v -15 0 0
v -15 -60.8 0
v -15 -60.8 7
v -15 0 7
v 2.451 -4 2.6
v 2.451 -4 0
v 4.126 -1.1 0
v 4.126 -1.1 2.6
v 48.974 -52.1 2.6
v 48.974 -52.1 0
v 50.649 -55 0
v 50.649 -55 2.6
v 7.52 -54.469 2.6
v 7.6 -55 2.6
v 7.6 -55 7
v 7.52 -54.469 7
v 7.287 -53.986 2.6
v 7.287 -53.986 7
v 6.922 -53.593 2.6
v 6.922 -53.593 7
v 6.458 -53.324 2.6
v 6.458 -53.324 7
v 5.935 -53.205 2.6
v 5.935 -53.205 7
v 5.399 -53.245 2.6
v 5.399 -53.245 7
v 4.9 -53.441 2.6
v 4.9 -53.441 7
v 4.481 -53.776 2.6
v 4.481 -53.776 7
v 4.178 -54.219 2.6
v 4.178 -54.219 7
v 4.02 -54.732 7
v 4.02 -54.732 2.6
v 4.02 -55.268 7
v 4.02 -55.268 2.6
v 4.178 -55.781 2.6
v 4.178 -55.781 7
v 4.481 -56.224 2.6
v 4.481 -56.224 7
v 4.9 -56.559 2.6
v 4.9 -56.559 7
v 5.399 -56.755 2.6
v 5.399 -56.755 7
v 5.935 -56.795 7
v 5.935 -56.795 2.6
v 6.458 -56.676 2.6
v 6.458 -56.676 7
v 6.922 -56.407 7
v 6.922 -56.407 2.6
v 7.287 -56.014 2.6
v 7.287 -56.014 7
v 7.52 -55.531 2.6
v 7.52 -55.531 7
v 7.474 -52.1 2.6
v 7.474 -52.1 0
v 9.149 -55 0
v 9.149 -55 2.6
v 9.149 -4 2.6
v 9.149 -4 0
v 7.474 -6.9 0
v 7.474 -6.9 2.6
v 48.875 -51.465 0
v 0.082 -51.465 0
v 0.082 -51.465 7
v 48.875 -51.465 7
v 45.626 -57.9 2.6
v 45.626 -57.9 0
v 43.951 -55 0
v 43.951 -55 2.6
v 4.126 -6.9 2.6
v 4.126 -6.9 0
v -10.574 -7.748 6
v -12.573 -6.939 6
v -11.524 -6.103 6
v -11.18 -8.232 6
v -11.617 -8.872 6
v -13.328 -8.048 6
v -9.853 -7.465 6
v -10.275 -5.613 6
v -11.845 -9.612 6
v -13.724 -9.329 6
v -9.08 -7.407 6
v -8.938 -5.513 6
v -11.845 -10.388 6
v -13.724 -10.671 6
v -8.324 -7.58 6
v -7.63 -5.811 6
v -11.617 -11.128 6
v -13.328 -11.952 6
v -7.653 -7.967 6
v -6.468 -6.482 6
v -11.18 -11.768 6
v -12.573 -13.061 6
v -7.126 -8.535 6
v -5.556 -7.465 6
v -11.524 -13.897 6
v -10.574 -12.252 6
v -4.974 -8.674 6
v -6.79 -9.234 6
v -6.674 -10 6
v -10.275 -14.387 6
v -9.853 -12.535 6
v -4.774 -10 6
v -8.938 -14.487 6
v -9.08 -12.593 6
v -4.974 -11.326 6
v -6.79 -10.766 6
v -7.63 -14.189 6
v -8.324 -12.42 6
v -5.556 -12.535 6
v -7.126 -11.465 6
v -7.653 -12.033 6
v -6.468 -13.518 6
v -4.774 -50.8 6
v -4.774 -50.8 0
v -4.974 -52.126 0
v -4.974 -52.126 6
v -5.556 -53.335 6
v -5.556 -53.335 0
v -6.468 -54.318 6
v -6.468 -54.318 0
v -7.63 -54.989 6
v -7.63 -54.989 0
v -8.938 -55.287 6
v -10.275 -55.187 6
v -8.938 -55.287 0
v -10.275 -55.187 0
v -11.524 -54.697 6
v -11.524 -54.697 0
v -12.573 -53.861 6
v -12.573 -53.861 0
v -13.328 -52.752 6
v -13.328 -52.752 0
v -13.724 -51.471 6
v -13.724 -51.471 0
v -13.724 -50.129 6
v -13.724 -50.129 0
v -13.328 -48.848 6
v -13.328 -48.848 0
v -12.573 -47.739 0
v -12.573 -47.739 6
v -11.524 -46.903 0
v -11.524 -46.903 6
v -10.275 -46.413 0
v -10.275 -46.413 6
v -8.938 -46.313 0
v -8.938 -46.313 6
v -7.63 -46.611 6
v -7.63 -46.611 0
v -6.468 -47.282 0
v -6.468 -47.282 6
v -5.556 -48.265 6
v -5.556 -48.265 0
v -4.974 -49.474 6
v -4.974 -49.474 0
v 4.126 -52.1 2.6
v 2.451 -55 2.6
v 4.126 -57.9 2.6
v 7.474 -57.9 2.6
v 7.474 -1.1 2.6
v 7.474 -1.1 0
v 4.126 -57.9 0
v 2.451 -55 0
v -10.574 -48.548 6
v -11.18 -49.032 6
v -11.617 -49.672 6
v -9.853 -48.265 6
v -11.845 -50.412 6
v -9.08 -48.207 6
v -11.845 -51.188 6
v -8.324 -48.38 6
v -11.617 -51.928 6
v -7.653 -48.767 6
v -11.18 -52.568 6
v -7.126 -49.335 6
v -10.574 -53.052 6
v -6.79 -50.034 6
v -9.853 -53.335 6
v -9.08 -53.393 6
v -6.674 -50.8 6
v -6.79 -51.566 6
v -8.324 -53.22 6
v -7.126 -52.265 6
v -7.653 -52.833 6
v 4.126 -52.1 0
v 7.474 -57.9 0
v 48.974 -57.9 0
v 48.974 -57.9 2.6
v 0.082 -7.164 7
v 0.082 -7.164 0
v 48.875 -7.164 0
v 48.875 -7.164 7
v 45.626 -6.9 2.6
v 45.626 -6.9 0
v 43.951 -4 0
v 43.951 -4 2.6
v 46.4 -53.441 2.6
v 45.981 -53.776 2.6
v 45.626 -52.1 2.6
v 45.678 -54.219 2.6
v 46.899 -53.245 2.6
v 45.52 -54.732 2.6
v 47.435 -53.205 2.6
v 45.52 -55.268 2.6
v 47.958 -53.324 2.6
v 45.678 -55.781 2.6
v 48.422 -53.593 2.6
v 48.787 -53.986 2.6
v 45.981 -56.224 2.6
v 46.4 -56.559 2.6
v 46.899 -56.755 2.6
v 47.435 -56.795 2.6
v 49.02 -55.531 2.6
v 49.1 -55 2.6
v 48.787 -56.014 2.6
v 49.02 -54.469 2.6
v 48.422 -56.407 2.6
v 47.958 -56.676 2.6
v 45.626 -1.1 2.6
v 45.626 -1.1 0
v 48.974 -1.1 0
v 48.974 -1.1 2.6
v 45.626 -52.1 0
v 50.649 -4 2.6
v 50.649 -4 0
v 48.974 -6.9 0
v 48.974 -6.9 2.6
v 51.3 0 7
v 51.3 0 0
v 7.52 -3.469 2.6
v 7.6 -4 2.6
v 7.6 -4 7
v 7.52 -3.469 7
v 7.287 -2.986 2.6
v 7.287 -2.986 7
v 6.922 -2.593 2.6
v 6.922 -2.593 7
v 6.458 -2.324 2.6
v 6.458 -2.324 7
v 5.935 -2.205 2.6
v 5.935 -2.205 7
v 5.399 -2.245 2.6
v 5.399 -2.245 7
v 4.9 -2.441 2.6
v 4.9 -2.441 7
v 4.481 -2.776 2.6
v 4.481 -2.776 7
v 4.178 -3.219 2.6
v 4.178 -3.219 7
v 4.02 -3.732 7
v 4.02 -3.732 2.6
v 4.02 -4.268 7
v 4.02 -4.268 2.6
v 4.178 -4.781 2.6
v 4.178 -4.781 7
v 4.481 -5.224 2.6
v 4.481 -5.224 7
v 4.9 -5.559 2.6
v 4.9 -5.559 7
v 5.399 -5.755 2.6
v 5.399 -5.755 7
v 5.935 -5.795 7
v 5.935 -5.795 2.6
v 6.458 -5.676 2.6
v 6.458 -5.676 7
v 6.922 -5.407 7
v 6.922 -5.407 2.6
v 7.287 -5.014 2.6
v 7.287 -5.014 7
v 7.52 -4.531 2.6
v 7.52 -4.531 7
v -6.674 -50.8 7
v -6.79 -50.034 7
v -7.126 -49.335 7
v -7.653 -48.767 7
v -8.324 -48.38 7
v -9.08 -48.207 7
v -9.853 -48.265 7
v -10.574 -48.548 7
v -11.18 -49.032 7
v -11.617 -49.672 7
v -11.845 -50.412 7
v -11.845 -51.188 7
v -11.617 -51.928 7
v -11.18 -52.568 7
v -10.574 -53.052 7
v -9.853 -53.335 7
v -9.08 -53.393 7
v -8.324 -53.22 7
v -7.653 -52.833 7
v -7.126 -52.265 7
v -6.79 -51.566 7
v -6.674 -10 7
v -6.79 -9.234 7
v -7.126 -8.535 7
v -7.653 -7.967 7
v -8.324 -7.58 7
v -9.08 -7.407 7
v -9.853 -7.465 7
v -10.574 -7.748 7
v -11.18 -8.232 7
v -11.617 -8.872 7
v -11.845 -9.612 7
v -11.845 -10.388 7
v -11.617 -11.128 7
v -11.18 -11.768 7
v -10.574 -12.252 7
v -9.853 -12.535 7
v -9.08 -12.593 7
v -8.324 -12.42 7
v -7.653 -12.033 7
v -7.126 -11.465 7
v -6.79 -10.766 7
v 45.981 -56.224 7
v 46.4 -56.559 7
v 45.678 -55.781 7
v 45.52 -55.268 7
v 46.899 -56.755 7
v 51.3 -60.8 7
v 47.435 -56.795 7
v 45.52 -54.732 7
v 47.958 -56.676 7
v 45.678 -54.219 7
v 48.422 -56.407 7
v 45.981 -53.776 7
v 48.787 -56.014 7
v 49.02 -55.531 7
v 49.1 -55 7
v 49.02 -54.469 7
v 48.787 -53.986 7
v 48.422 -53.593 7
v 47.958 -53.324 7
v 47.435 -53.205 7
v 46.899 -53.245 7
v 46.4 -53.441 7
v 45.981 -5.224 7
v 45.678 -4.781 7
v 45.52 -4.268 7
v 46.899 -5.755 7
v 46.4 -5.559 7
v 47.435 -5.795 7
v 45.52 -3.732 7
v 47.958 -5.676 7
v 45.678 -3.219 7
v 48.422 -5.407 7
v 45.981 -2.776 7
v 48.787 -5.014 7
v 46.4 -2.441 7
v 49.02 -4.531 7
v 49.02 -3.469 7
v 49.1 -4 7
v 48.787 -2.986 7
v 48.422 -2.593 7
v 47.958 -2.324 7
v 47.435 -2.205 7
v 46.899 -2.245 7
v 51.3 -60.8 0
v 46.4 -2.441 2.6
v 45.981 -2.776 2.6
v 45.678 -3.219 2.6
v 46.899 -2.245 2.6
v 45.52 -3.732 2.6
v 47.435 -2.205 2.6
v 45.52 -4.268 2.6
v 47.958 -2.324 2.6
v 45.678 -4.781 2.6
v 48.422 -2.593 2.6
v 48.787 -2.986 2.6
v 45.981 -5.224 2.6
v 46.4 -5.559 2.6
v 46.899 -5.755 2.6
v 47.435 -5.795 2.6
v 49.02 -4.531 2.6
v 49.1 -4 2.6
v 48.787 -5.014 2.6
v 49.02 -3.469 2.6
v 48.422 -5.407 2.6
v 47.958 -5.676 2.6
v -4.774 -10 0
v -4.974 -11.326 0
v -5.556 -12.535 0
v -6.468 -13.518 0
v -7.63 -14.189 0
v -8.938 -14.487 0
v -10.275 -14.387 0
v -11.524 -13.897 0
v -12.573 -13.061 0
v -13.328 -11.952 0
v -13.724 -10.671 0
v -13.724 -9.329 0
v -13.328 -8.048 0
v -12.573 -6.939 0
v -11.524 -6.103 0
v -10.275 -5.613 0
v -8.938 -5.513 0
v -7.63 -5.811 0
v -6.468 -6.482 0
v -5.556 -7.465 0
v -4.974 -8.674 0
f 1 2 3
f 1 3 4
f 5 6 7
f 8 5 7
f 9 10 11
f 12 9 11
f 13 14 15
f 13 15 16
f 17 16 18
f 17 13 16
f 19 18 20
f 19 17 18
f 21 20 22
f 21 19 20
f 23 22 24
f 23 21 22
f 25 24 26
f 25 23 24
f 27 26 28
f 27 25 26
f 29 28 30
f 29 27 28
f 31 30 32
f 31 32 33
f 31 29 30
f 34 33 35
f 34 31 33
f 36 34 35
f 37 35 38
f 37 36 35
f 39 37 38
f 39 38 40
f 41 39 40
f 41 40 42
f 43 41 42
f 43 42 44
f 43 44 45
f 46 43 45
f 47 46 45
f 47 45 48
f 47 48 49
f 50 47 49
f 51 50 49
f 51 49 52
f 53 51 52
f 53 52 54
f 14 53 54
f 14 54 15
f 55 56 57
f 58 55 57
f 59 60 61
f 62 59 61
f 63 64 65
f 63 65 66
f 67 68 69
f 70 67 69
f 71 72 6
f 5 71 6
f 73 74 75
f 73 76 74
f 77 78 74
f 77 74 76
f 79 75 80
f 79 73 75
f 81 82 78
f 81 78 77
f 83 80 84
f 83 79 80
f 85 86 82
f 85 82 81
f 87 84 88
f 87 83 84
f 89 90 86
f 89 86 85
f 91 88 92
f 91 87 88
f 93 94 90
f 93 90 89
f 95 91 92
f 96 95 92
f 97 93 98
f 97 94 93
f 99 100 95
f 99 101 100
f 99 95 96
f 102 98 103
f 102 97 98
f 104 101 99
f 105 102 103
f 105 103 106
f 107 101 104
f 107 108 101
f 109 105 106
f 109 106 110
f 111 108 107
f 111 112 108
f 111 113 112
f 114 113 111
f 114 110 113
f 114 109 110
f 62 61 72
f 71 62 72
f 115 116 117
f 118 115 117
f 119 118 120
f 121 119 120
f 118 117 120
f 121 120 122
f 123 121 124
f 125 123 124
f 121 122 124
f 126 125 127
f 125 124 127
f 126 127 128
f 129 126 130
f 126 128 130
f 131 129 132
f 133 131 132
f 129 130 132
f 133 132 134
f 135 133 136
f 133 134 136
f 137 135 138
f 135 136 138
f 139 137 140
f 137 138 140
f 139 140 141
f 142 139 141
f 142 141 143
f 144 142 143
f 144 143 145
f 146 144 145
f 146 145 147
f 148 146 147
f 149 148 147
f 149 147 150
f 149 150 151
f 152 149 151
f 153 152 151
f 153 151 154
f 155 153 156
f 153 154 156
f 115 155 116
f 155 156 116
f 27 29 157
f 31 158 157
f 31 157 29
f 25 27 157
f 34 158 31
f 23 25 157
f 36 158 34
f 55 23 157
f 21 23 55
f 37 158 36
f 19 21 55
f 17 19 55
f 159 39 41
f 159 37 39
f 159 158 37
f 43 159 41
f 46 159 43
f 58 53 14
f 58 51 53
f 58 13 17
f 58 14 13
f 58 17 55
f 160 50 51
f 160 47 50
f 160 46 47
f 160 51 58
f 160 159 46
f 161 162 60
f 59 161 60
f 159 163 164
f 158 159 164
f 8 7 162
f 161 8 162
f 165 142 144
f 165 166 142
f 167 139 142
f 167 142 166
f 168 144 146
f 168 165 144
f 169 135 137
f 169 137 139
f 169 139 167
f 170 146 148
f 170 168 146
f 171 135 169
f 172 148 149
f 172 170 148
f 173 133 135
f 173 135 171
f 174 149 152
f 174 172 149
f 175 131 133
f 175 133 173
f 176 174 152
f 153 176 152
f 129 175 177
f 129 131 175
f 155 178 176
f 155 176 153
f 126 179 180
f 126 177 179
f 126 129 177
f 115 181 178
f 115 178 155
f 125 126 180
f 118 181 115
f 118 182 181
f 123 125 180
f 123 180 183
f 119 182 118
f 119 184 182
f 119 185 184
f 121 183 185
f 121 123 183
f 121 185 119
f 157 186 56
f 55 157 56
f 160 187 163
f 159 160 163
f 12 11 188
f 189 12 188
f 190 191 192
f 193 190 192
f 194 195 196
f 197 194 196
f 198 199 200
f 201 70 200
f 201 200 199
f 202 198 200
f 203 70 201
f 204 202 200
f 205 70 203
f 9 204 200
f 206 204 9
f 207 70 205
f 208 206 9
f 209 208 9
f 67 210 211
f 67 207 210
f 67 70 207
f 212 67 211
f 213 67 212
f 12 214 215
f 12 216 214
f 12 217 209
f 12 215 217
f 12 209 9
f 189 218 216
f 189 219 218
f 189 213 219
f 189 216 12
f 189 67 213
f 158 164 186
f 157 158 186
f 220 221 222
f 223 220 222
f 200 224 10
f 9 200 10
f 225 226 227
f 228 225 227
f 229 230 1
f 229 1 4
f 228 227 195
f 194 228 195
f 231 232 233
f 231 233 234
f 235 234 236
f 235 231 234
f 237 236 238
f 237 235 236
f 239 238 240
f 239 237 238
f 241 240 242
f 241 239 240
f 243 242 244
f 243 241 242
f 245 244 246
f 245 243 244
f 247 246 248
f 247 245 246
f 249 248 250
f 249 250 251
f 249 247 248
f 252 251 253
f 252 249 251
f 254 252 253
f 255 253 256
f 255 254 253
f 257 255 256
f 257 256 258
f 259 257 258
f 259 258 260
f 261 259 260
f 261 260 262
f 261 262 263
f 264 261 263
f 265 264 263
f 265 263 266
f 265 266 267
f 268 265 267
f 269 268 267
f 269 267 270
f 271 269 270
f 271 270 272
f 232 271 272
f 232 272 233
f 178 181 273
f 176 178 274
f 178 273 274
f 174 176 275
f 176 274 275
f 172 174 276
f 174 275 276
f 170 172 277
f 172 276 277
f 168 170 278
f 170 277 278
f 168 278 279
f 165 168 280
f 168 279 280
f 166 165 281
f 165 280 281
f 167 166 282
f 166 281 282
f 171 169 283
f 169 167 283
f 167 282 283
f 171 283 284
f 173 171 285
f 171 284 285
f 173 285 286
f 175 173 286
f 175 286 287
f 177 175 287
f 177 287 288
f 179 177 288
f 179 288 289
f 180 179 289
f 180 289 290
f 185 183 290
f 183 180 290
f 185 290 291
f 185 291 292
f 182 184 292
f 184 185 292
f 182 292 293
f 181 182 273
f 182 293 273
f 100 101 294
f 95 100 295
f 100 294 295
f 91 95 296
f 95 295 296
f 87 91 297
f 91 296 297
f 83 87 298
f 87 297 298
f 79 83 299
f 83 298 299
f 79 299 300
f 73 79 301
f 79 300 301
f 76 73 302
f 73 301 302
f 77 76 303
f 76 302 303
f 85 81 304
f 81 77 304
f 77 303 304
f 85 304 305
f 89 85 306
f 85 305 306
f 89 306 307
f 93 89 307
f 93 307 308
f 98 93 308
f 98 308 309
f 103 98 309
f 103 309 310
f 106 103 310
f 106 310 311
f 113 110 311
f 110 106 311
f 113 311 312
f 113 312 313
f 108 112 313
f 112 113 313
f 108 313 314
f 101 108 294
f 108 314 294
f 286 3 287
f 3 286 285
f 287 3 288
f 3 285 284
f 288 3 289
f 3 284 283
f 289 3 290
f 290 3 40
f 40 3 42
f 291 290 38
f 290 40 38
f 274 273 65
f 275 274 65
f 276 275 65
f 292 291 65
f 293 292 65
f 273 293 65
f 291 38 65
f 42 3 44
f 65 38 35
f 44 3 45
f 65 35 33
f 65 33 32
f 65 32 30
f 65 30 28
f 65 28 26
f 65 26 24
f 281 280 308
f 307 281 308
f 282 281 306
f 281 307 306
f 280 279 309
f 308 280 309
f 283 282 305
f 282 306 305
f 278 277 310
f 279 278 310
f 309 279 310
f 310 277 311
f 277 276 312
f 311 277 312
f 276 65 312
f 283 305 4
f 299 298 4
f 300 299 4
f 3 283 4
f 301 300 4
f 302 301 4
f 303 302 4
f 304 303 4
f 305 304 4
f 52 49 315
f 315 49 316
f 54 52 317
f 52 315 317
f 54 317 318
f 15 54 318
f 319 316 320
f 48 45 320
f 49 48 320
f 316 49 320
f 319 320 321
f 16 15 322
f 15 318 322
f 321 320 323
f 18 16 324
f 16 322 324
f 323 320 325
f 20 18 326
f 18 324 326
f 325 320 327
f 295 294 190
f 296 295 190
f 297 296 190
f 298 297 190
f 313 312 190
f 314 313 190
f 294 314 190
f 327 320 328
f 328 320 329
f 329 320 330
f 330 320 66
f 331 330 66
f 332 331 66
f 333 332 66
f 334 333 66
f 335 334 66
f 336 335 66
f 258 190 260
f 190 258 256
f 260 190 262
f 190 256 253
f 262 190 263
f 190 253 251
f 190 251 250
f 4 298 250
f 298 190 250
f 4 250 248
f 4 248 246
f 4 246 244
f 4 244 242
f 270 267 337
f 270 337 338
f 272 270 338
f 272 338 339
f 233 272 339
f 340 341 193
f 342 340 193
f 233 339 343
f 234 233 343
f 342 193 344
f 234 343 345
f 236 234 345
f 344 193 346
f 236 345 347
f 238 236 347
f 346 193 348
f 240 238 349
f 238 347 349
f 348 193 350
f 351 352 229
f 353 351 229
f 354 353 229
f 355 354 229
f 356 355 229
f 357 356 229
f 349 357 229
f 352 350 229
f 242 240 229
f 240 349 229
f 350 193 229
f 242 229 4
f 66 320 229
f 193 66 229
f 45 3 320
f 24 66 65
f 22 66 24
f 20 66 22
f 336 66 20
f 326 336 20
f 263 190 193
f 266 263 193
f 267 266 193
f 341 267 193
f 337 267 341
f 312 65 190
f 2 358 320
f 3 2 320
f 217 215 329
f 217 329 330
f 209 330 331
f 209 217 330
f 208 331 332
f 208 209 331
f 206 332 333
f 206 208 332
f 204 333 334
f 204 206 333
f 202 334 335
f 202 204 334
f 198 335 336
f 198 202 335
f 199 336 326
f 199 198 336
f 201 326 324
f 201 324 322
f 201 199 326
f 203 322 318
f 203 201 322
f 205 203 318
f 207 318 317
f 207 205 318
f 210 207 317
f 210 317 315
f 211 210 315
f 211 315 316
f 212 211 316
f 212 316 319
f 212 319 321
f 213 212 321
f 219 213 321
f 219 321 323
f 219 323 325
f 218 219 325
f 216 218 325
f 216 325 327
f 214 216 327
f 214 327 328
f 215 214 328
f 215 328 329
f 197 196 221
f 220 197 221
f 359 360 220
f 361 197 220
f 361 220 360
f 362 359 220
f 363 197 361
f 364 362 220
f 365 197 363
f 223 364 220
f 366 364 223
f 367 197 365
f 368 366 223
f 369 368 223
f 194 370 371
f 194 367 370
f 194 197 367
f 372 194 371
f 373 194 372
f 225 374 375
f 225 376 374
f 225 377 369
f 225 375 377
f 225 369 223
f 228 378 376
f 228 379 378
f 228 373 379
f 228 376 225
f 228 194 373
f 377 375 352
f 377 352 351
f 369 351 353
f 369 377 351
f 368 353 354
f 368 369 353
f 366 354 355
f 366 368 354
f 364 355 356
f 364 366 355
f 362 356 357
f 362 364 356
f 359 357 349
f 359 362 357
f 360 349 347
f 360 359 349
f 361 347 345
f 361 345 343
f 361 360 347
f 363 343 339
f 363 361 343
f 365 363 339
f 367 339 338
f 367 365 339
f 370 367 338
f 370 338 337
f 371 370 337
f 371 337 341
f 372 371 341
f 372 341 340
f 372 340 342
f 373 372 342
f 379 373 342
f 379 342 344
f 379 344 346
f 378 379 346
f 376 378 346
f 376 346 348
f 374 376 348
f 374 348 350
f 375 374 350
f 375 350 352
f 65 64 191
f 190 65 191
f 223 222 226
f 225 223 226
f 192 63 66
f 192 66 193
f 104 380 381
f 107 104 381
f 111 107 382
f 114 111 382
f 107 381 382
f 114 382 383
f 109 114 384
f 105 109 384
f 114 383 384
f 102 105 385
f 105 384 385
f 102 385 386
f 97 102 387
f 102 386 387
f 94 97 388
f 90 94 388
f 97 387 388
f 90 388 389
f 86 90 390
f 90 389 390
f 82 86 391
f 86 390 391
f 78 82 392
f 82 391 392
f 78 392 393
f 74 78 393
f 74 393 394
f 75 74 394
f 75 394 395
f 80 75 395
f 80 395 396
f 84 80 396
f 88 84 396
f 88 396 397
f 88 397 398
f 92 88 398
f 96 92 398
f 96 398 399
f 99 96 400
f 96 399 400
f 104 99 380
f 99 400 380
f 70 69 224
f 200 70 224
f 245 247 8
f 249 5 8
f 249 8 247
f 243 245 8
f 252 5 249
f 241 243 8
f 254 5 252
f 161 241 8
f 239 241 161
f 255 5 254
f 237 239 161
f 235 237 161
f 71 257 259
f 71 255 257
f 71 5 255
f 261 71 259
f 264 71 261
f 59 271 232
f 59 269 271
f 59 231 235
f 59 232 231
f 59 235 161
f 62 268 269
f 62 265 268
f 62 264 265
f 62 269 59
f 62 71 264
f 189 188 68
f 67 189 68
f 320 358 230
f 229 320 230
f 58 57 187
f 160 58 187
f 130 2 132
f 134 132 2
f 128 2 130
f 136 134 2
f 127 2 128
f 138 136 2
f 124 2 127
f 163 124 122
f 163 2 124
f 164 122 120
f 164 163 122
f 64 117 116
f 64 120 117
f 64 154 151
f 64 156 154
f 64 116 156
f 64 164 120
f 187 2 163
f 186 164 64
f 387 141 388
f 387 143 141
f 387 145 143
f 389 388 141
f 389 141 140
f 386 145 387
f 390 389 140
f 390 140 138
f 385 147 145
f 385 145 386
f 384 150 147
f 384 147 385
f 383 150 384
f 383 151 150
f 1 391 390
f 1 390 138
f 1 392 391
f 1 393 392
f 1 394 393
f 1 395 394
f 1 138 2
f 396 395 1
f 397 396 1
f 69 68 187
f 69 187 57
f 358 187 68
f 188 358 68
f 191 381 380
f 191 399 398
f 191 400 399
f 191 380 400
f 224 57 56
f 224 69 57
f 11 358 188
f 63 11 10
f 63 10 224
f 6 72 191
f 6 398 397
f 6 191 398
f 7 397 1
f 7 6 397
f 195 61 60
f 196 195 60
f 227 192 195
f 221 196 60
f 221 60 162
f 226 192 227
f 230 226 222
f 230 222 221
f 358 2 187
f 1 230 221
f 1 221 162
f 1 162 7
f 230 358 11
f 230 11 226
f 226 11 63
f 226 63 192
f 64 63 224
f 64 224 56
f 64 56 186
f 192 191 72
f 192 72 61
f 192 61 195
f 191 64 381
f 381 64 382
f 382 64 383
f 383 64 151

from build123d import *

# Parameters (mm, degrees)
F2_W      = 51.3
F2_H      = 60.8
F2_R      = 1.8
F2_W_2    = 48.7926781061
F2_H_2    = 44.3010972813
F3_DEPTH  = 7
F4_DEPTH  = 15
F5_R      = 2.6
F6_DEPTH  = 25
F7_R      = 1.8
F8_DEPTH  = 2.6
F9_R      = 4.5
F9_R_2    = 2.6
F10_DEPTH = 6


with BuildPart() as f3:
    # F2 (on Top) → F3 (new body)
    with BuildSketch(Plane.XY):
        with Locations((25.65, -30.4)):
            Rectangle(F2_W, F2_H)
        with Locations((5.8, -55)):
            Circle(F2_R, mode=Mode.SUBTRACT)
        with Locations((47.3, -55)):
            Circle(F2_R, mode=Mode.SUBTRACT)
        with Locations((24.4784042297, -29.3142660521)):
            Rectangle(F2_W_2, F2_H_2, mode=Mode.SUBTRACT)
        with Locations((5.8, -4)):
            Circle(F2_R, mode=Mode.SUBTRACT)
        with Locations((47.3, -4)):
            Circle(F2_R, mode=Mode.SUBTRACT)
    extrude(amount=F3_DEPTH)

    # F4 (add): a face of the model
    f4_faces = [f3.faces().sort_by_distance(p)[0] for p in [
        (0, -30.4, 3.5),
    ]]
    extrude(f4_faces, amount=F4_DEPTH)

    # F5 (on face) → F6 (cut)
    with BuildSketch(Plane.XY.offset(7)):
        with Locations((-9.2740962282, -10)):
            Circle(F5_R)
        with Locations((-9.2740962282, -50.8)):
            Circle(F5_R)
    extrude(amount=-F6_DEPTH, mode=Mode.SUBTRACT)

    # F7 (on face) → F8 (cut)
    with BuildSketch(Plane(origin=(0, 0, 0), x_dir=(1, 0, 0), z_dir=(0, 0, -1))):
        Polygon((7.4743157806, 52.1), (9.1486315613, 55), (7.4743157806, 57.9), (4.1256842194, 57.9), (2.4513684387, 55), (4.1256842194, 52.1), align=None)
        with Locations((5.8, 55)):
            Circle(F7_R, mode=Mode.SUBTRACT)
        Polygon((48.9743157806, 52.1), (50.6486315613, 55), (48.9743157806, 57.9), (45.6256842194, 57.9), (43.9513684387, 55), (45.6256842194, 52.1), align=None)
        with Locations((47.3, 55)):
            Circle(F7_R, mode=Mode.SUBTRACT)
        Polygon((48.9743157806, 1.1), (50.6486315613, 4), (48.9743157806, 6.9), (45.6256842194, 6.9), (43.9513684387, 4), (45.6256842194, 1.1), align=None)
        with Locations((47.3, 4)):
            Circle(F7_R, mode=Mode.SUBTRACT)
        Polygon((7.4743157806, 1.1), (9.1486315613, 4), (7.4743157806, 6.9), (4.1256842194, 6.9), (2.4513684387, 4), (4.1256842194, 1.1), align=None)
        with Locations((5.8, 4)):
            Circle(F7_R, mode=Mode.SUBTRACT)
    extrude(amount=-F8_DEPTH, mode=Mode.SUBTRACT)

    # F9 (on face) → F10 (cut)
    with BuildSketch(Plane(origin=(0, 0, 0), x_dir=(1, 0, 0), z_dir=(0, 0, -1))):
        with Locations((-9.2740962282, 10)):
            Circle(F9_R)
        with Locations((-9.2740962282, 10)):
            Circle(F9_R_2, mode=Mode.SUBTRACT)
        with Locations((-9.2740962282, 50.8)):
            Circle(F9_R)
        with Locations((-9.2740962282, 50.8)):
            Circle(F9_R_2, mode=Mode.SUBTRACT)
    extrude(amount=-F10_DEPTH, mode=Mode.SUBTRACT)


solid = f3.part
